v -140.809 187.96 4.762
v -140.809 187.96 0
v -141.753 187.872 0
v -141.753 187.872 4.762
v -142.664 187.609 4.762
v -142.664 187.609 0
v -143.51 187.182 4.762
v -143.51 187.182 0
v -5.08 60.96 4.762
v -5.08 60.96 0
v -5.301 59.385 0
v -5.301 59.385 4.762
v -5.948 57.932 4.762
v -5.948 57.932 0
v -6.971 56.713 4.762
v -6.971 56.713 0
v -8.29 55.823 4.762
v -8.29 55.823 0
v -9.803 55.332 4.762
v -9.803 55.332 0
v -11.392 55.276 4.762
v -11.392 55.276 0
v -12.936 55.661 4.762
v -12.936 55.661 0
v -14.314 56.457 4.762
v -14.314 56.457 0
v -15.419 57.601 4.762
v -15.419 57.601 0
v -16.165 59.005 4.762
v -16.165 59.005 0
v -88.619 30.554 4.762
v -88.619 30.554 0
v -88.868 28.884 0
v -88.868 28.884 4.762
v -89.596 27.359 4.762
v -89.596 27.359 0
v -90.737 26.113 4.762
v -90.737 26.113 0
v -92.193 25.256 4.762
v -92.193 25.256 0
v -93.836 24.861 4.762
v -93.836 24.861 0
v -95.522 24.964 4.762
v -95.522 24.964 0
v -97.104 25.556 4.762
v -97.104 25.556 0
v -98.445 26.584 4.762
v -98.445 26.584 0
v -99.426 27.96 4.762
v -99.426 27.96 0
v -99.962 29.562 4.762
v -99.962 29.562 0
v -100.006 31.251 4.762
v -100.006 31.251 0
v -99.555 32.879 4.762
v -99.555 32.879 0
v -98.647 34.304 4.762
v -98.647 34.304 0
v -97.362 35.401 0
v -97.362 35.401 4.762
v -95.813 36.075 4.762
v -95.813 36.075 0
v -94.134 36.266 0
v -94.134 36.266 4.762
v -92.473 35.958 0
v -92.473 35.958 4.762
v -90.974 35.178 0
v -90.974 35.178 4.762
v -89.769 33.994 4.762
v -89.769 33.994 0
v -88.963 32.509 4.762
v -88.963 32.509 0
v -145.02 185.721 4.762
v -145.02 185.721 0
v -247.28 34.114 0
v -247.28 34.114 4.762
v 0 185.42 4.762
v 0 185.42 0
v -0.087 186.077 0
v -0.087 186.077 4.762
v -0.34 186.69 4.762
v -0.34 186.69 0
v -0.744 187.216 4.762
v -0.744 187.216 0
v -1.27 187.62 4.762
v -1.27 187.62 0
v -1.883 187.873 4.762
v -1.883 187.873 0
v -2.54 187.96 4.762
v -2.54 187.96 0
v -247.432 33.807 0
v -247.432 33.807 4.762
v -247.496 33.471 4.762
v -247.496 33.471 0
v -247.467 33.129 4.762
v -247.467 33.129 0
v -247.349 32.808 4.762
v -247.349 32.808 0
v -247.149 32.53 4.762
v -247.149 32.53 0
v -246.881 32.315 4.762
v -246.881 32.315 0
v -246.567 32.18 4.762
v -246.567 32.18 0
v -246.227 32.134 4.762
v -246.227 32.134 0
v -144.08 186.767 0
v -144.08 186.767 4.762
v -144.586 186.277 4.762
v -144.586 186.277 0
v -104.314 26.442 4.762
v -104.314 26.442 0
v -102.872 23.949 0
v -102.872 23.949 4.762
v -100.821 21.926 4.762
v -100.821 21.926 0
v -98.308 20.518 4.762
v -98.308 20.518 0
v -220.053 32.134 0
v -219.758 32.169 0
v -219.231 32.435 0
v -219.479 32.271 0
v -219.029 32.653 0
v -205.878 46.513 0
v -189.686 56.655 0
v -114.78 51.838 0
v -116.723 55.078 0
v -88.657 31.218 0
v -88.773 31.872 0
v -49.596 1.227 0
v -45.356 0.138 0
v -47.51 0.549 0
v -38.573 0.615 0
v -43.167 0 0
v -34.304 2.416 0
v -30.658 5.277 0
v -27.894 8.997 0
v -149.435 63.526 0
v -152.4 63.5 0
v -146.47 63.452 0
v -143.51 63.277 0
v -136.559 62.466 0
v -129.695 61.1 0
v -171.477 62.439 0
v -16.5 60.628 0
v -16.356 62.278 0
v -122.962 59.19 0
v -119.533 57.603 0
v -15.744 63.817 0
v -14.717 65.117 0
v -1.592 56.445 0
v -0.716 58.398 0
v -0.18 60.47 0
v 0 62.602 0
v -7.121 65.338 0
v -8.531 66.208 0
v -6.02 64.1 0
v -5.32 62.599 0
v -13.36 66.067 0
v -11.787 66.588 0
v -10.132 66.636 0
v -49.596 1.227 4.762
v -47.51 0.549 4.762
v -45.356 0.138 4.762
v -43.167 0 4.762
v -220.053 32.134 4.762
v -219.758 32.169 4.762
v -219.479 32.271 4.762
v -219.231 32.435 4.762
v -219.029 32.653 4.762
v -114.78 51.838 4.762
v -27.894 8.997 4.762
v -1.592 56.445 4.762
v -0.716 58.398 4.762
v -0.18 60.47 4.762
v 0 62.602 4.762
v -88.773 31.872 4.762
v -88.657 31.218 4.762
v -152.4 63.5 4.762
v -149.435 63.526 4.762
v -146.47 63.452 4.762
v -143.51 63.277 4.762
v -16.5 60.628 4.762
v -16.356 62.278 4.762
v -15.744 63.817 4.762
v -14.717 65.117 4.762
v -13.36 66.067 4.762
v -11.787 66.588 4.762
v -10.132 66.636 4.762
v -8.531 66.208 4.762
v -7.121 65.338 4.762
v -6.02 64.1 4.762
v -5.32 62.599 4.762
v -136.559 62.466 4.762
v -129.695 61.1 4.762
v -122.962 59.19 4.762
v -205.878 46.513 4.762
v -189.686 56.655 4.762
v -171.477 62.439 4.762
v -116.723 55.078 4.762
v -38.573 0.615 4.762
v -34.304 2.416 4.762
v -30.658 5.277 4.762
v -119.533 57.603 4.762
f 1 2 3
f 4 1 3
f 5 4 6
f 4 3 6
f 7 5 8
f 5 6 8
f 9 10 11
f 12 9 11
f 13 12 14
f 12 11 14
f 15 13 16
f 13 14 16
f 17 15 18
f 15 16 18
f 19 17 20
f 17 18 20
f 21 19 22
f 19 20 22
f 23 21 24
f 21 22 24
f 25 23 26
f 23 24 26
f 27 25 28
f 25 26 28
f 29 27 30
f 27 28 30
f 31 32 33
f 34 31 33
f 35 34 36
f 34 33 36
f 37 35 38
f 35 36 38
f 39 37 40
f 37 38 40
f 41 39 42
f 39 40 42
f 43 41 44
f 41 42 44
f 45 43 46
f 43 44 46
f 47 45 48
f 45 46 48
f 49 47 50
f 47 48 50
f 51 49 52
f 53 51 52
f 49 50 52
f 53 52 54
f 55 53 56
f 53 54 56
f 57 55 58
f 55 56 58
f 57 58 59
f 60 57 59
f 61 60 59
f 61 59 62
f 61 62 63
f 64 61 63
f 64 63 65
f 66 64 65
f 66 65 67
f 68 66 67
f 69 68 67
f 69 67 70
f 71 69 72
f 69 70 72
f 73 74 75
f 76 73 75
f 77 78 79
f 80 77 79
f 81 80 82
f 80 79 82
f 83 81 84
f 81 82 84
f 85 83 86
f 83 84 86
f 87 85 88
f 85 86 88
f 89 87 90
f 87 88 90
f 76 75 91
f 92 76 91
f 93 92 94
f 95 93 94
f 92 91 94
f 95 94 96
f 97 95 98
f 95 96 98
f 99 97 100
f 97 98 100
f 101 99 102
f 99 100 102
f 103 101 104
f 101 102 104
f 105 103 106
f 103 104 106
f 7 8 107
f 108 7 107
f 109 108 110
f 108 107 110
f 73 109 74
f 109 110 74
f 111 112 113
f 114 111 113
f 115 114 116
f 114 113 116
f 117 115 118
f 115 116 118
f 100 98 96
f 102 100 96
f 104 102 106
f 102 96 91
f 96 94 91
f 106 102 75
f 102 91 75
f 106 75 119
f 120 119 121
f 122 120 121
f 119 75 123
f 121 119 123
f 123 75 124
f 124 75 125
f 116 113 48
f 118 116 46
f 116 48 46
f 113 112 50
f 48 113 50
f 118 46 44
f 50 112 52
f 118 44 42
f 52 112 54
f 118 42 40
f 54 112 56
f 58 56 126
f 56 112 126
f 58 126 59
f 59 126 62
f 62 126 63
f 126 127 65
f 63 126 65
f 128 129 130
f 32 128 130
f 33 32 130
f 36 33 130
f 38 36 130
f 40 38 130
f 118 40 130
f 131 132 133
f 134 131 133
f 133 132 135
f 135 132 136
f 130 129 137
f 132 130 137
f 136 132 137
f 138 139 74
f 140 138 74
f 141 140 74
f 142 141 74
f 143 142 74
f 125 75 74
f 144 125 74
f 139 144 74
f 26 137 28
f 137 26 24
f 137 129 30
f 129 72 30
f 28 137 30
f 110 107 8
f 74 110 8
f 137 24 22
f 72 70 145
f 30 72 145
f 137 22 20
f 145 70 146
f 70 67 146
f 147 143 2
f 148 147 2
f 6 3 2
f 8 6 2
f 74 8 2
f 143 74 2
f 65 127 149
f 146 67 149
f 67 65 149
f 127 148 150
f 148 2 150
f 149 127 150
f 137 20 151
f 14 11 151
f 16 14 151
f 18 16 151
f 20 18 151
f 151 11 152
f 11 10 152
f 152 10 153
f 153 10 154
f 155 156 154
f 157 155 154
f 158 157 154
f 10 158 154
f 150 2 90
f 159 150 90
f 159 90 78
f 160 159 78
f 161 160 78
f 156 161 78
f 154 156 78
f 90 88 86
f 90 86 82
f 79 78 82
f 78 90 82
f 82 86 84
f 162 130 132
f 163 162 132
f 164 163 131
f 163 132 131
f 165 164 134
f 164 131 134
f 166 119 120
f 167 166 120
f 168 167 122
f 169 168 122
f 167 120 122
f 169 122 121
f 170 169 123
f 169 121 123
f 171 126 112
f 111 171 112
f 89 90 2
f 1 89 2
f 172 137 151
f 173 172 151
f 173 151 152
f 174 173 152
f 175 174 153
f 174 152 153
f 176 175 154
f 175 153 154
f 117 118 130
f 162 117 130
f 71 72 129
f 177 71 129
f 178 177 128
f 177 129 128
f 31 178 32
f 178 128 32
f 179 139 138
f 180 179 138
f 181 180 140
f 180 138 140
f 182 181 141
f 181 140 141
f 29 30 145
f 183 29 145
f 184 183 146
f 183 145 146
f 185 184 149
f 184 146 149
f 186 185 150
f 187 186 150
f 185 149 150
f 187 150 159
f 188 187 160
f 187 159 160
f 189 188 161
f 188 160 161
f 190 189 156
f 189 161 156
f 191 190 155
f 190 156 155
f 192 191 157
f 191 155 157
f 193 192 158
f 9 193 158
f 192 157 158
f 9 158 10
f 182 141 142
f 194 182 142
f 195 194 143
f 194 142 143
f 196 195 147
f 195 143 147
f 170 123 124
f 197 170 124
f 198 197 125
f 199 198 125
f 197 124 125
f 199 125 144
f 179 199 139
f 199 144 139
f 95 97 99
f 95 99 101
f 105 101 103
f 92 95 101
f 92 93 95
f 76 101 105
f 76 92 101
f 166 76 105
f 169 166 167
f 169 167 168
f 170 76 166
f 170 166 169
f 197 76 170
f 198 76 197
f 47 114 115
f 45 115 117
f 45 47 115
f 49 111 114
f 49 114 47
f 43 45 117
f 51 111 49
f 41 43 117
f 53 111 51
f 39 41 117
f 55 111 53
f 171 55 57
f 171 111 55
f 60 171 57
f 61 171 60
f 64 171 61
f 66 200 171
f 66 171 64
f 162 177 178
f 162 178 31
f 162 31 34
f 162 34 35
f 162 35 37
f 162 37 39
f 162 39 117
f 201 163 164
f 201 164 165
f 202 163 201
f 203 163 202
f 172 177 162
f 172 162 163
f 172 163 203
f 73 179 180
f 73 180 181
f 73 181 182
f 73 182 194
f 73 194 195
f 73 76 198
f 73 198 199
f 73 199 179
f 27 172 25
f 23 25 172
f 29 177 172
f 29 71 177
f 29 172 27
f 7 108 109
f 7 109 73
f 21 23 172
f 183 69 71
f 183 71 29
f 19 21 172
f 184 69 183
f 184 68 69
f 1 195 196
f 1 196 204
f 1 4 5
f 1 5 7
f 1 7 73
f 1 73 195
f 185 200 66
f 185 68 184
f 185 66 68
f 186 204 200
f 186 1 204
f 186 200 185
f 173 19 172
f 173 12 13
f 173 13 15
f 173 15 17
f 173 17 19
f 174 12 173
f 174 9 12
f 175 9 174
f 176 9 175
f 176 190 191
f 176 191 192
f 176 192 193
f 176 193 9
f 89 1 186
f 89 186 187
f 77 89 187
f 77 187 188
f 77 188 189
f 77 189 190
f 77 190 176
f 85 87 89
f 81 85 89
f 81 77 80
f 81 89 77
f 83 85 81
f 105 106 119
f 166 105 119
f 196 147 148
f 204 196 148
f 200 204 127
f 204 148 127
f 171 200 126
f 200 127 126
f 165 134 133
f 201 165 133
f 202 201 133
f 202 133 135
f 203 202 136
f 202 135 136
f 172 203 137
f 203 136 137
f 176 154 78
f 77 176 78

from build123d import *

# Parameters (mm, degrees)
F1_DEPTH = 4.7625


with BuildPart() as f1:
    # F0 (on Top) → F1 (new body)
    with BuildSketch(Plane.XY):
        with BuildLine():
            ThreePointArc((-152.4, 63.5), (-147.952155, 63.501619), (-143.51, 63.27672))
            Line((-143.51, 63.27672), (-143.51, 187.182388))
            ThreePointArc((-143.51, 187.182388), (-144.341638, 186.530517), (-145.020427, 185.7207))
            Line((-145.020427, 185.7207), (-247.280253, 34.114273))
            ThreePointArc((-247.280253, 34.114273), (-247.348719, 32.807869), (-246.227376, 32.134098))
            Line((-246.227376, 32.134098), (-220.052506, 32.134098))
            ThreePointArc((-220.052506, 32.134098), (-219.478663, 32.271135), (-219.028659, 32.652674))
            ThreePointArc((-219.028659, 32.652674), (-189.686124, 56.655212), (-152.4, 63.5))
        make_face()
        with BuildLine():
            Line((-98.30838, 20.51779), (-49.596252, 1.226792))
            ThreePointArc((-49.596252, 1.226792), (-52.981384, 31.905787), (-25.70408, 17.4625))
            ThreePointArc((-25.70408, 17.4625), (-26.260302, 13.090239), (-27.893533, 8.996512))
            Line((-27.893533, 8.996512), (-1.59233, 56.445139))
            ThreePointArc((-1.59233, 56.445139), (-0.404525, 59.422396), (0, 62.602222))
            Line((0, 62.602222), (0, 185.42))
            ThreePointArc((0, 185.42), (-0.743949, 187.216051), (-2.54, 187.96))
            Line((-2.54, 187.96), (-140.808916, 187.96))
            ThreePointArc((-140.808916, 187.96), (-142.214311, 187.761728), (-143.51, 187.182388))
            Line((-143.51, 187.182388), (-143.51, 63.27672))
            ThreePointArc((-143.51, 63.27672), (-133.112936, 61.851877), (-122.961928, 59.189894))
            ThreePointArc((-122.961928, 59.189894), (-118.033451, 56.445639), (-114.779625, 51.837664))
            Line((-114.779625, 51.837664), (-104.314477, 26.441552))
            ThreePointArc((-104.314477, 26.441552), (-98.237009, 40.619001), (-84.189692, 34.246517))
            ThreePointArc((-84.189692, 34.246517), (-83.702674, 32.428941), (-83.538674, 30.554409))
            ThreePointArc((-83.538674, 30.554409), (-88.266341, 21.625832), (-98.30838, 20.51779))
        make_face()
        with BuildLine():
            ThreePointArc((-5.08, 60.96), (-9.802601, 55.331824), (-16.165343, 59.005355))
            ThreePointArc((-16.165343, 59.005355), (-11.787399, 66.588176), (-5.08, 60.96))
        make_face(mode=Mode.SUBTRACT)
        with BuildLine():
            ThreePointArc((-49.596252, 1.226792), (-46.439412, 0.30944), (-43.16658, 0))
            ThreePointArc((-43.16658, 0), (-34.303691, 2.416301), (-27.893533, 8.996512))
            ThreePointArc((-27.893533, 8.996512), (-26.260302, 13.090239), (-25.70408, 17.4625))
            ThreePointArc((-25.70408, 17.4625), (-52.981384, 31.905787), (-49.596252, 1.226792))
        make_face()
        with BuildLine():
            ThreePointArc((-104.314477, 26.441552), (-101.91403, 22.868694), (-98.30838, 20.51779))
            ThreePointArc((-98.30838, 20.51779), (-88.266341, 21.625832), (-83.538674, 30.554409))
            ThreePointArc((-83.538674, 30.554409), (-83.702674, 32.428941), (-84.189692, 34.246517))
            ThreePointArc((-84.189692, 34.246517), (-98.237009, 40.619001), (-104.314477, 26.441552))
        make_face()
        with BuildLine():
            ThreePointArc((-88.618674, 30.554409), (-99.96185, 29.56201), (-88.963331, 32.509054))
            ThreePointArc((-88.963331, 32.509054), (-88.705498, 31.546809), (-88.618674, 30.554409))
        make_face(mode=Mode.SUBTRACT)
    extrude(amount=F1_DEPTH)


solid = f1.part
